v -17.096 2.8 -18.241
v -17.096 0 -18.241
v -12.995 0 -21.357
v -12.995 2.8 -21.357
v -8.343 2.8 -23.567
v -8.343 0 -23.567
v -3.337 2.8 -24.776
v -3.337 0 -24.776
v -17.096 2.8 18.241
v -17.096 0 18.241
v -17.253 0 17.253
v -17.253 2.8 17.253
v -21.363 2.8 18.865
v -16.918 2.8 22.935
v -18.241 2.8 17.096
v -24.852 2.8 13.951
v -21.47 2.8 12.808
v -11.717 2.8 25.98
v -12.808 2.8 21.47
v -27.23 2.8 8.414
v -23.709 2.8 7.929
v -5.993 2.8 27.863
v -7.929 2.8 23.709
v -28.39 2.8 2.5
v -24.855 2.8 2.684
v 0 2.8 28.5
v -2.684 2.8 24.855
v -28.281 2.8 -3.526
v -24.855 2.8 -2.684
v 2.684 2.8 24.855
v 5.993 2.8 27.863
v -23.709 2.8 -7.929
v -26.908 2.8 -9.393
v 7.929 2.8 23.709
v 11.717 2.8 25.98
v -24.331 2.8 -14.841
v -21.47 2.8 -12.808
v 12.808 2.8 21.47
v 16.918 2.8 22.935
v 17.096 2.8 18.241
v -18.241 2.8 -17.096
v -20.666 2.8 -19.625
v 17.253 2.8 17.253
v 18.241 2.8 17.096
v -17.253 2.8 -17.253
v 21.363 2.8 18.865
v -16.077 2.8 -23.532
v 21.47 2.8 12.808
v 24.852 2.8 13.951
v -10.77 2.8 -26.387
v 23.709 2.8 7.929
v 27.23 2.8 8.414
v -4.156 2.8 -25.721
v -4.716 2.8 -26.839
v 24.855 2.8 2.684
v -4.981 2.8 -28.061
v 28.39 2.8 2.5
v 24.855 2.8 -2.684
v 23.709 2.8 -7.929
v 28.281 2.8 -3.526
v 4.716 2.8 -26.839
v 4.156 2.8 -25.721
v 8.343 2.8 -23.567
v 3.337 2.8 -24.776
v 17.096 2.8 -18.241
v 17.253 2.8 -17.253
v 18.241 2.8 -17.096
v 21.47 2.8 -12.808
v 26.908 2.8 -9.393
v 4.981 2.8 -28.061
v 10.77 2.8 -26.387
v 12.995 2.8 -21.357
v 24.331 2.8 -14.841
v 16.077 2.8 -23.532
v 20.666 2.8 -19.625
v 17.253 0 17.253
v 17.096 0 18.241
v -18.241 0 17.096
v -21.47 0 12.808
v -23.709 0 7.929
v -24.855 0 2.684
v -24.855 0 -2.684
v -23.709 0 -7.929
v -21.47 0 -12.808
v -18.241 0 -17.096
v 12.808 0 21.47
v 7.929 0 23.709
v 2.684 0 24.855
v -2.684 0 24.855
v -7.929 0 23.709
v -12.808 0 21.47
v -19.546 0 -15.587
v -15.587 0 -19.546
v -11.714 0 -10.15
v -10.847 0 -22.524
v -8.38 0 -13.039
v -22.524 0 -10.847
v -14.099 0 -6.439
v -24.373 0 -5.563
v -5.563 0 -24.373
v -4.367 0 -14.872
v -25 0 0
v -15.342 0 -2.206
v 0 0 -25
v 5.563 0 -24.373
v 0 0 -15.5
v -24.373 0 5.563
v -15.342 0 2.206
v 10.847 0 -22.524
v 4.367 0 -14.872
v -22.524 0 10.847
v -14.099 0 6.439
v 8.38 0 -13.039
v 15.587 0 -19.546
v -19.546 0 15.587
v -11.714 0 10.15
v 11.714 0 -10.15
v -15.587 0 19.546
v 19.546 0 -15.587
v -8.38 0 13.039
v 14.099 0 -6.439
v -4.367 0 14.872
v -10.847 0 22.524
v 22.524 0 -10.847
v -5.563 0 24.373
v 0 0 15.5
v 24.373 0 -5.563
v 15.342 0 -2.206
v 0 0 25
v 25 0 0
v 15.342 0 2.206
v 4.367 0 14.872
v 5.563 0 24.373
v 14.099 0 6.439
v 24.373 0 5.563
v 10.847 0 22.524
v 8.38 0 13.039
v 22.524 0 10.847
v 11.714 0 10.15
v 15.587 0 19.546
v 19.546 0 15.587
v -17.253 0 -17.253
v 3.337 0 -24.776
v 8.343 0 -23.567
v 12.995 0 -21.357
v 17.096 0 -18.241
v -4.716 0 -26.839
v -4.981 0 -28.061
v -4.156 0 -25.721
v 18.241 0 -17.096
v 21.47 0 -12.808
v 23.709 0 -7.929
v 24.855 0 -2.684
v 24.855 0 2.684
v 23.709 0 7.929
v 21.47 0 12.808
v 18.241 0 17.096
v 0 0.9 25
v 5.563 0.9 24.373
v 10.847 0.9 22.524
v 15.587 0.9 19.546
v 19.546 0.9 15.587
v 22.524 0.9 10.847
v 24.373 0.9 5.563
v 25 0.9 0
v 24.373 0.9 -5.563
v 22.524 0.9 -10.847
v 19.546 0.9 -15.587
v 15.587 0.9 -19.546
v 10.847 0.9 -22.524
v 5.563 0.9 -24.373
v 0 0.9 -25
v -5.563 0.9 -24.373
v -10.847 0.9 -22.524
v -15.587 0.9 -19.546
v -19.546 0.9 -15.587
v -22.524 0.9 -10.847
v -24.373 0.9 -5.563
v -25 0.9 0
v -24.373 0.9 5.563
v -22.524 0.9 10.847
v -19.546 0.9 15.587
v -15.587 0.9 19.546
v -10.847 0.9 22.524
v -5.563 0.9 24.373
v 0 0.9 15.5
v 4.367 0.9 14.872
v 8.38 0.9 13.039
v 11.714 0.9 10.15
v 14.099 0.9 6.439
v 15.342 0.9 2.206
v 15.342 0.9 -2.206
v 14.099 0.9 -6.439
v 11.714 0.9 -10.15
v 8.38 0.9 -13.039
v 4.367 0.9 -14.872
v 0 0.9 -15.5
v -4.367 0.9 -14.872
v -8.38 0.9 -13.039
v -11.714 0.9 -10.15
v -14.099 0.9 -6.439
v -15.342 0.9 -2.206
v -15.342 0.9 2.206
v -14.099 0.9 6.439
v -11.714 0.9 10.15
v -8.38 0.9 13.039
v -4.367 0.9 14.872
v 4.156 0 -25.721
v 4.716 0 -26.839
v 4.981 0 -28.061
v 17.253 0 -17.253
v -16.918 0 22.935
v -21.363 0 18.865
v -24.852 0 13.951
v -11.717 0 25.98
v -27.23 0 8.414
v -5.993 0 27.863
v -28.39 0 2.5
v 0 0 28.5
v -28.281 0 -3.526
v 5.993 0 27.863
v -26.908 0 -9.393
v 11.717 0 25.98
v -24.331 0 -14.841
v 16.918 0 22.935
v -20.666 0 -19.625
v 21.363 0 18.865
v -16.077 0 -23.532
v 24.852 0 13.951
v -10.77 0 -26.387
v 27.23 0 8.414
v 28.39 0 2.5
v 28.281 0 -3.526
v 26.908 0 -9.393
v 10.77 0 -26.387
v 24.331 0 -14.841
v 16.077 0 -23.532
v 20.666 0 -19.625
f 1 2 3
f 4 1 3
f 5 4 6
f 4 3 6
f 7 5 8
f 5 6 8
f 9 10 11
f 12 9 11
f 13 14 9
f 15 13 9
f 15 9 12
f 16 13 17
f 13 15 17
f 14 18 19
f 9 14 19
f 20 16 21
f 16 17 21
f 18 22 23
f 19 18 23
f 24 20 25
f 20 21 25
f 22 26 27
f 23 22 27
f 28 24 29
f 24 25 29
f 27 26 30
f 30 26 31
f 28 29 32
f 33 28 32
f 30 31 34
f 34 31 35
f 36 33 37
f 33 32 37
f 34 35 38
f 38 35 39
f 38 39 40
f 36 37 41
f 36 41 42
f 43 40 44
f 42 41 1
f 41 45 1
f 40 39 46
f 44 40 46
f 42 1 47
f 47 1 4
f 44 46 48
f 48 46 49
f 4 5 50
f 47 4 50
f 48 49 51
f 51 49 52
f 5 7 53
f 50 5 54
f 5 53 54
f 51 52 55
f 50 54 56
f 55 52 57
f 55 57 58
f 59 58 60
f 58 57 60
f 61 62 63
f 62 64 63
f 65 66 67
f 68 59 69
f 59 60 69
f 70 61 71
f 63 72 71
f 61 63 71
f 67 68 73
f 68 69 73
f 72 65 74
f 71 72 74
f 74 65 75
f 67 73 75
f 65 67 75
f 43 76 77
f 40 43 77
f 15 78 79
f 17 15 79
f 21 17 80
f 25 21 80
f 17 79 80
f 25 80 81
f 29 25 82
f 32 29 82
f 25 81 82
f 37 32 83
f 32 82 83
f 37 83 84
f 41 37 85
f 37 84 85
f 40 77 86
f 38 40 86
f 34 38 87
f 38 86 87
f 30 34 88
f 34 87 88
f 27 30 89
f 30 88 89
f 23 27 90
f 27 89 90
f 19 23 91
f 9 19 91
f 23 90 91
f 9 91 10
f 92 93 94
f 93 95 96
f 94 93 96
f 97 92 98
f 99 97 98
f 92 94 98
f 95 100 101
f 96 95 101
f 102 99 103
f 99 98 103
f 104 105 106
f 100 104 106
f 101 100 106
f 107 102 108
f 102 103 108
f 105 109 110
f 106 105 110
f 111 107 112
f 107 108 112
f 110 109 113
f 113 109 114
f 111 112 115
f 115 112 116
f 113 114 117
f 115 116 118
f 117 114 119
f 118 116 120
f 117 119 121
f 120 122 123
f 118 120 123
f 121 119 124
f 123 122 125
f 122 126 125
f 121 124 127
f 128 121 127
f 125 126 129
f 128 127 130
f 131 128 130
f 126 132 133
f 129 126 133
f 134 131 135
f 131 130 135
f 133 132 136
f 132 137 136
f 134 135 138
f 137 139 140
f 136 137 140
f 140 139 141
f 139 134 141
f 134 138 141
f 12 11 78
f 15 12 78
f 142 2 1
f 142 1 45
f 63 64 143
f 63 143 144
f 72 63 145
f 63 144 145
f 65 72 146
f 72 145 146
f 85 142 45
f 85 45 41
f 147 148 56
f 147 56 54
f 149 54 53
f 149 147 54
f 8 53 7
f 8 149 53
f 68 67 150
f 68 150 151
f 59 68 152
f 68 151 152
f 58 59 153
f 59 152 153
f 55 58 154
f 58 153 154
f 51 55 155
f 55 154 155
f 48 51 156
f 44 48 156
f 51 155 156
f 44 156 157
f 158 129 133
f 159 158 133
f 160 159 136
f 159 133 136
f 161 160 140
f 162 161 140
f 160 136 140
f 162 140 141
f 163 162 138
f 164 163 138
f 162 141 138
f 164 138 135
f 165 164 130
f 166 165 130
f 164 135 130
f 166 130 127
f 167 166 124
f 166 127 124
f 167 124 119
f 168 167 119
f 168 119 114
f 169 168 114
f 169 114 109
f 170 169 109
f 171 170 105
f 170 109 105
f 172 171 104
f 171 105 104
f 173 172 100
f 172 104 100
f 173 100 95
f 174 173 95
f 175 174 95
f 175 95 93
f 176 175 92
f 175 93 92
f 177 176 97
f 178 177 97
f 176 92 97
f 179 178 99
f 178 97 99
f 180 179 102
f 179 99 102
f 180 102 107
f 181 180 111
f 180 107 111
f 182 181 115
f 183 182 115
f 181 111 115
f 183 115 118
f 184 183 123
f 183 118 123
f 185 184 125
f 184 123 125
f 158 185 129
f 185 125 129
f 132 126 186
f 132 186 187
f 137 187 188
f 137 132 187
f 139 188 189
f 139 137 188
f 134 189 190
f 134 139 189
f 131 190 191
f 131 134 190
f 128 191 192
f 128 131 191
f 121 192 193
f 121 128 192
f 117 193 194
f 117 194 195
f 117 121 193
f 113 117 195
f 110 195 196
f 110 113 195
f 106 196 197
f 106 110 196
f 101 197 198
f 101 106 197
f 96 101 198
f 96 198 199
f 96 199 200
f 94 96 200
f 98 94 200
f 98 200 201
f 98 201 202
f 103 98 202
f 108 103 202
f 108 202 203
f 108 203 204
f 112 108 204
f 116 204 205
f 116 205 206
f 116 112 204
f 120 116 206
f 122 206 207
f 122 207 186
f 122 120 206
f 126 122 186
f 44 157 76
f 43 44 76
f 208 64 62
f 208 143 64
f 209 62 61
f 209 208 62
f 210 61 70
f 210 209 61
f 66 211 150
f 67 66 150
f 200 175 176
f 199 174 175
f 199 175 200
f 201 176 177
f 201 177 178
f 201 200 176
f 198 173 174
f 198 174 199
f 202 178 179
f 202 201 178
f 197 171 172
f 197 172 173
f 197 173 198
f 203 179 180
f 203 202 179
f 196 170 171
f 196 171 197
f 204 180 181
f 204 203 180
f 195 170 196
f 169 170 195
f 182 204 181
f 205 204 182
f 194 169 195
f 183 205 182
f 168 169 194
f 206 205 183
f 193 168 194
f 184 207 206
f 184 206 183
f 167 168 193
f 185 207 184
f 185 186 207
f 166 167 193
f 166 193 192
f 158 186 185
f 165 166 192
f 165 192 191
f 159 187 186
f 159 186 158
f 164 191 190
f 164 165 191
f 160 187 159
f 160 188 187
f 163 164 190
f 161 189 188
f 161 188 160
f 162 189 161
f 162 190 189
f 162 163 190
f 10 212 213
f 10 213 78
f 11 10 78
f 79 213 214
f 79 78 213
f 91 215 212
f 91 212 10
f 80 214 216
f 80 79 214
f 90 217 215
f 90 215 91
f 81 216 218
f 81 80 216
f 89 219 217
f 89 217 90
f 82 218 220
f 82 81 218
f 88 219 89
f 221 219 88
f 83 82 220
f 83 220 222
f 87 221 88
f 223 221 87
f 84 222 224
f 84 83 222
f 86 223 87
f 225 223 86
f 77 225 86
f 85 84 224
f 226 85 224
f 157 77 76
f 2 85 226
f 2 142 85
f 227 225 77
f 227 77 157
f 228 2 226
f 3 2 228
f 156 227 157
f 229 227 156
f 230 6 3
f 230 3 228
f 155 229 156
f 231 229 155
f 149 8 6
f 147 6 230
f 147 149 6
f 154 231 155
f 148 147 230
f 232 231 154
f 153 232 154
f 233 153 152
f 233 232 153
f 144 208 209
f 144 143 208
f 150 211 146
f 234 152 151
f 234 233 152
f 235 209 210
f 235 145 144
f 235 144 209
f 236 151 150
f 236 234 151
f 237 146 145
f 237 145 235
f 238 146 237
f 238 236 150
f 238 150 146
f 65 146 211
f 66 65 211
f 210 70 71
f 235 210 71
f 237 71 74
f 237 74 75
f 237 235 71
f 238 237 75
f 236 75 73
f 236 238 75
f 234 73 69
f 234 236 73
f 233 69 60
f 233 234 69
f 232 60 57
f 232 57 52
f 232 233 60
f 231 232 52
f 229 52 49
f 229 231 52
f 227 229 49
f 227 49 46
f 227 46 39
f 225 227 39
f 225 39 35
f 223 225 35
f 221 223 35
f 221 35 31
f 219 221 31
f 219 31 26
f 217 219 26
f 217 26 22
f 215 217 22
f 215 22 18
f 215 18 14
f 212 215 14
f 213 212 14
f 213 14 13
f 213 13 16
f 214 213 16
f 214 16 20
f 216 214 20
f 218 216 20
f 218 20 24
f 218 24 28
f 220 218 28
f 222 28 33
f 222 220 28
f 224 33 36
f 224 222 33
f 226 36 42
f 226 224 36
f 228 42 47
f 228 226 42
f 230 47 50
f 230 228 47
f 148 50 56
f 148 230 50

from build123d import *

# Parameters (mm, degrees)
SKETCH1_R               = 25
SKETCH1_R_2             = 15.5
BOSS_EXTRUDE1_DEPTH     = 0.9
SKETCH2_R               = 28.5
SKETCH2_R_2             = 25
BOSS_EXTRUDE2_DEPTH     = 2.8
CUT_EXTRUDE1_DEPTH      = 41.402227661
CUT_EXTRUDE1_DEPTH_BACK = 41.402227661
SKETCH3_R               = 5
BOSS_EXTRUDE3_START     = -2.8
BOSS_EXTRUDE3_DEPTH     = 2.8


with BuildPart() as part:
    # Sketch1 → Boss-Extrude1 (new body)
    with BuildSketch(Plane(origin=(0, 0, 0), x_dir=(1, 0, 0), z_dir=(0, 1, 0))):
        with Locations(Location((0, 0, 0), (0, 0, 270))):
            Circle(SKETCH1_R)
        with Locations(Location((0, 0, 0), (0, 0, 270))):
            Circle(SKETCH1_R_2, mode=Mode.SUBTRACT)
    extrude(amount=BOSS_EXTRUDE1_DEPTH)


with BuildPart() as body_2:
    # Sketch2 → Boss-Extrude2 (new body)
    with BuildSketch(Plane.XZ):
        with Locations(Location((0, 0, 0), (0, 0, 270))):
            Circle(SKETCH2_R)
        with Locations(Location((0, 0, 0), (0, 0, 270))):
            Circle(SKETCH2_R_2, mode=Mode.SUBTRACT)
    extrude(amount=-BOSS_EXTRUDE2_DEPTH)

    # Sketch3 → Cut-Extrude1 (cut, two sides: drawn at the far end of the back side and taken through both)
    with BuildSketch(Plane(origin=(0, 2.8, 0), x_dir=(1, 0, 0), z_dir=(0, 1, 0)).offset(-CUT_EXTRUDE1_DEPTH_BACK)):
        with Locations((0, 28.5)):
            Circle(SKETCH3_R)
    extrude(amount=CUT_EXTRUDE1_DEPTH + CUT_EXTRUDE1_DEPTH_BACK, mode=Mode.SUBTRACT)

    # Sketch4 → Boss-Extrude3 (add)
    with BuildSketch(Plane(origin=(0, 2.8, 0), x_dir=(1, 0, 0), z_dir=(0, 1, 0)).offset(BOSS_EXTRUDE3_START)):
        with BuildLine():
            Line((17.253405461, 17.253405461), (18.240919233, 17.095872764))
            ThreePointArc((18.240919233, 17.095872764), (17.67766953, 17.67766953), (17.095872764, 18.240919233))
            Line((17.095872764, 18.240919233), (17.253405461, 17.253405461))
        make_face()
        with BuildLine():
            ThreePointArc((17.095872764, -18.240919233), (17.67766953, -17.67766953), (18.240919233, -17.095872764))
            Line((18.240919233, -17.095872764), (17.253405461, -17.253405461))
            Line((17.253405461, -17.253405461), (17.095872764, -18.240919233))
        make_face()
        with BuildLine():
            ThreePointArc((-18.240919233, -17.095872764), (-17.67766953, -17.67766953), (-17.095872764, -18.240919233))
            Line((-17.095872764, -18.240919233), (-17.253405461, -17.253405461))
            Line((-17.253405461, -17.253405461), (-18.240919233, -17.095872764))
        make_face()
        with BuildLine():
            Line((-17.253405461, 17.253405461), (-18.240919233, 17.095872764))
            ThreePointArc((-18.240919233, 17.095872764), (-17.67766953, 17.67766953), (-17.095872764, 18.240919233))
            Line((-17.095872764, 18.240919233), (-17.253405461, 17.253405461))
        make_face()
    extrude(amount=BOSS_EXTRUDE3_DEPTH)


solid = Compound([part.part, body_2.part])
